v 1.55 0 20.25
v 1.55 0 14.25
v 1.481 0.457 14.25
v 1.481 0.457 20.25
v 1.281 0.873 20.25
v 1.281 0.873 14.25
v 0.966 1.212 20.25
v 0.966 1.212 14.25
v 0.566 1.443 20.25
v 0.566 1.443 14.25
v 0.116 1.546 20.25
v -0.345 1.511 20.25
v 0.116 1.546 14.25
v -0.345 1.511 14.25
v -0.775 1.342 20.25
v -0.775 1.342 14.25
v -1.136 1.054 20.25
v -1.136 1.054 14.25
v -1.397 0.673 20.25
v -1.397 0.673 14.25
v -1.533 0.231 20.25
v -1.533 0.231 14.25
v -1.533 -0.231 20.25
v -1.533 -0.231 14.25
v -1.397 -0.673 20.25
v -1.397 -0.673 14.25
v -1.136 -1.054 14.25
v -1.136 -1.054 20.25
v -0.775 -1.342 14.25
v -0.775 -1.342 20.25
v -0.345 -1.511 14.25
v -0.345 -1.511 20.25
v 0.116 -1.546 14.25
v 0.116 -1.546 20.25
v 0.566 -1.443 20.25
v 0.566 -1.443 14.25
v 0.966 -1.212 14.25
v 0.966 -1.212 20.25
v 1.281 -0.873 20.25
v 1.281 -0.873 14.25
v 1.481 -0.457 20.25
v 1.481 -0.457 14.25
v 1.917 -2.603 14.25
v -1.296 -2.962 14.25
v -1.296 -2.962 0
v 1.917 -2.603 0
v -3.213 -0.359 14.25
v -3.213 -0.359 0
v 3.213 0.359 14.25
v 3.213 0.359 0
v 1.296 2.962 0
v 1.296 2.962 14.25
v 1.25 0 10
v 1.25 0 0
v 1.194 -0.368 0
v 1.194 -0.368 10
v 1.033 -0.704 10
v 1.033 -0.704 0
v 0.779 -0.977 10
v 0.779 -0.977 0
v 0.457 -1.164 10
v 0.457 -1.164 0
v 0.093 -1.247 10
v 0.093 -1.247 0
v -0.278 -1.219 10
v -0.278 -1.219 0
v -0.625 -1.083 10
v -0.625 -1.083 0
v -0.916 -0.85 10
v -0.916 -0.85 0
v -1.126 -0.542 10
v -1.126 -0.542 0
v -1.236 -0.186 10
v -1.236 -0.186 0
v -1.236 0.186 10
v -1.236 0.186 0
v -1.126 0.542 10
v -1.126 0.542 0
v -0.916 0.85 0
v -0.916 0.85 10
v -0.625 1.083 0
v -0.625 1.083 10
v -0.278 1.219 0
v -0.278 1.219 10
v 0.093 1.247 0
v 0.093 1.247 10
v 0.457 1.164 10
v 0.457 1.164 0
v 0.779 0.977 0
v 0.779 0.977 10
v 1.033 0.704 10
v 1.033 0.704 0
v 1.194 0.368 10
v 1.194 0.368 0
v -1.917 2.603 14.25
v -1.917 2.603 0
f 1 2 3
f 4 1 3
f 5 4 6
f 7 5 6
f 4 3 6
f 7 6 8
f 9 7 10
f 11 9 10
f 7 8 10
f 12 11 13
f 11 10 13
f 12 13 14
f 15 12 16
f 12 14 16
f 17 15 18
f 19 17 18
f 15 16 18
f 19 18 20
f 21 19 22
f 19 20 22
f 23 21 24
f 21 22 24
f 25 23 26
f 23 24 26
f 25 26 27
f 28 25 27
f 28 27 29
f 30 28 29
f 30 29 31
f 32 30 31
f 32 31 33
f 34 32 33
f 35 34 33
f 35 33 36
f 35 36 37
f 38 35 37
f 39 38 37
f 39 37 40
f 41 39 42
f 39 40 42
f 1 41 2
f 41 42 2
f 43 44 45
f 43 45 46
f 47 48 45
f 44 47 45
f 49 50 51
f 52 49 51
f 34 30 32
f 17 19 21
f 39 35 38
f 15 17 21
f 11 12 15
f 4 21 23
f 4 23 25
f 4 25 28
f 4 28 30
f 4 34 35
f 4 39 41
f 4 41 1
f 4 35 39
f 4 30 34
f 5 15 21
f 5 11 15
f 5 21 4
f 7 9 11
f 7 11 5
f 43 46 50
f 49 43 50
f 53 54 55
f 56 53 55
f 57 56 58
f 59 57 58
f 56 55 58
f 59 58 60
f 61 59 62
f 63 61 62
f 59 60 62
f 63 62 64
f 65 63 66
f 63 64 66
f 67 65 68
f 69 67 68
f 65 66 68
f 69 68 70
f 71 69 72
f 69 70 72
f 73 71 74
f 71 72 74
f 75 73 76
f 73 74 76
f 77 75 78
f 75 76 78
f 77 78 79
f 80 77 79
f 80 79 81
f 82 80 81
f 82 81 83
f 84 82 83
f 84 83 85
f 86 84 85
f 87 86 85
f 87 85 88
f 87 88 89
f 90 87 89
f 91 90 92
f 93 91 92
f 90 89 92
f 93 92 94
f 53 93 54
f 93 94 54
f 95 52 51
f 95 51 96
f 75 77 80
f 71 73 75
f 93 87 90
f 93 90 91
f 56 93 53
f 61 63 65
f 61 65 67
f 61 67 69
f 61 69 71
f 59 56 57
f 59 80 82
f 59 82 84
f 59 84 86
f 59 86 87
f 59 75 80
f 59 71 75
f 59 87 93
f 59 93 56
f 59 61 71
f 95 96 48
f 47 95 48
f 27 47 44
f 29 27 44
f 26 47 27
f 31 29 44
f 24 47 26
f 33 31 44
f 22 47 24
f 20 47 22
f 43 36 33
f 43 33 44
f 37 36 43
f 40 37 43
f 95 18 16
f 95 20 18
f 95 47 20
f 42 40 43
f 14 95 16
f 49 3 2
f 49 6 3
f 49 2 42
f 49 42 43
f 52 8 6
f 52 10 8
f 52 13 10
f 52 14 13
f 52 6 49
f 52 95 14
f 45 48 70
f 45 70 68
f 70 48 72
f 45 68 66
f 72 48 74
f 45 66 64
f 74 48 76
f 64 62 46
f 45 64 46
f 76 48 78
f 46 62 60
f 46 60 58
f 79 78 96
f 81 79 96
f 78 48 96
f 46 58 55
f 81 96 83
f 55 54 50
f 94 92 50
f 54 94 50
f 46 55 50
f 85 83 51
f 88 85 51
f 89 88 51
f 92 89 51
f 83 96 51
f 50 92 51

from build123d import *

# Parameters (mm, degrees)
F1_DEPTH = 14.25
F2_R     = 1.25
F3_DEPTH = 10
F4_R     = 1.55
F5_DEPTH = 6


with BuildPart() as f1:
    # F0 (on Top) → F1 (new body)
    with BuildSketch(Plane.XY):
        Polygon((-1.917285, 2.603335), (-3.213197, -0.35875), (-1.295912, -2.962085), (1.917285, -2.603335), (3.213197, 0.35875), (1.295912, 2.962085), align=None)
    extrude(amount=F1_DEPTH)

    # F2 (on face) → F3 (cut)
    with BuildSketch(Plane(origin=(0, 0, 0), x_dir=(1, 0, 0), z_dir=(0, 0, -1))):
        Circle(F2_R)
    extrude(amount=-F3_DEPTH, mode=Mode.SUBTRACT)

    # F4 (on face) → F5 (join)
    with BuildSketch(Plane.XY.offset(14.25)):
        Circle(F4_R)
    extrude(amount=F5_DEPTH)


solid = f1.part
